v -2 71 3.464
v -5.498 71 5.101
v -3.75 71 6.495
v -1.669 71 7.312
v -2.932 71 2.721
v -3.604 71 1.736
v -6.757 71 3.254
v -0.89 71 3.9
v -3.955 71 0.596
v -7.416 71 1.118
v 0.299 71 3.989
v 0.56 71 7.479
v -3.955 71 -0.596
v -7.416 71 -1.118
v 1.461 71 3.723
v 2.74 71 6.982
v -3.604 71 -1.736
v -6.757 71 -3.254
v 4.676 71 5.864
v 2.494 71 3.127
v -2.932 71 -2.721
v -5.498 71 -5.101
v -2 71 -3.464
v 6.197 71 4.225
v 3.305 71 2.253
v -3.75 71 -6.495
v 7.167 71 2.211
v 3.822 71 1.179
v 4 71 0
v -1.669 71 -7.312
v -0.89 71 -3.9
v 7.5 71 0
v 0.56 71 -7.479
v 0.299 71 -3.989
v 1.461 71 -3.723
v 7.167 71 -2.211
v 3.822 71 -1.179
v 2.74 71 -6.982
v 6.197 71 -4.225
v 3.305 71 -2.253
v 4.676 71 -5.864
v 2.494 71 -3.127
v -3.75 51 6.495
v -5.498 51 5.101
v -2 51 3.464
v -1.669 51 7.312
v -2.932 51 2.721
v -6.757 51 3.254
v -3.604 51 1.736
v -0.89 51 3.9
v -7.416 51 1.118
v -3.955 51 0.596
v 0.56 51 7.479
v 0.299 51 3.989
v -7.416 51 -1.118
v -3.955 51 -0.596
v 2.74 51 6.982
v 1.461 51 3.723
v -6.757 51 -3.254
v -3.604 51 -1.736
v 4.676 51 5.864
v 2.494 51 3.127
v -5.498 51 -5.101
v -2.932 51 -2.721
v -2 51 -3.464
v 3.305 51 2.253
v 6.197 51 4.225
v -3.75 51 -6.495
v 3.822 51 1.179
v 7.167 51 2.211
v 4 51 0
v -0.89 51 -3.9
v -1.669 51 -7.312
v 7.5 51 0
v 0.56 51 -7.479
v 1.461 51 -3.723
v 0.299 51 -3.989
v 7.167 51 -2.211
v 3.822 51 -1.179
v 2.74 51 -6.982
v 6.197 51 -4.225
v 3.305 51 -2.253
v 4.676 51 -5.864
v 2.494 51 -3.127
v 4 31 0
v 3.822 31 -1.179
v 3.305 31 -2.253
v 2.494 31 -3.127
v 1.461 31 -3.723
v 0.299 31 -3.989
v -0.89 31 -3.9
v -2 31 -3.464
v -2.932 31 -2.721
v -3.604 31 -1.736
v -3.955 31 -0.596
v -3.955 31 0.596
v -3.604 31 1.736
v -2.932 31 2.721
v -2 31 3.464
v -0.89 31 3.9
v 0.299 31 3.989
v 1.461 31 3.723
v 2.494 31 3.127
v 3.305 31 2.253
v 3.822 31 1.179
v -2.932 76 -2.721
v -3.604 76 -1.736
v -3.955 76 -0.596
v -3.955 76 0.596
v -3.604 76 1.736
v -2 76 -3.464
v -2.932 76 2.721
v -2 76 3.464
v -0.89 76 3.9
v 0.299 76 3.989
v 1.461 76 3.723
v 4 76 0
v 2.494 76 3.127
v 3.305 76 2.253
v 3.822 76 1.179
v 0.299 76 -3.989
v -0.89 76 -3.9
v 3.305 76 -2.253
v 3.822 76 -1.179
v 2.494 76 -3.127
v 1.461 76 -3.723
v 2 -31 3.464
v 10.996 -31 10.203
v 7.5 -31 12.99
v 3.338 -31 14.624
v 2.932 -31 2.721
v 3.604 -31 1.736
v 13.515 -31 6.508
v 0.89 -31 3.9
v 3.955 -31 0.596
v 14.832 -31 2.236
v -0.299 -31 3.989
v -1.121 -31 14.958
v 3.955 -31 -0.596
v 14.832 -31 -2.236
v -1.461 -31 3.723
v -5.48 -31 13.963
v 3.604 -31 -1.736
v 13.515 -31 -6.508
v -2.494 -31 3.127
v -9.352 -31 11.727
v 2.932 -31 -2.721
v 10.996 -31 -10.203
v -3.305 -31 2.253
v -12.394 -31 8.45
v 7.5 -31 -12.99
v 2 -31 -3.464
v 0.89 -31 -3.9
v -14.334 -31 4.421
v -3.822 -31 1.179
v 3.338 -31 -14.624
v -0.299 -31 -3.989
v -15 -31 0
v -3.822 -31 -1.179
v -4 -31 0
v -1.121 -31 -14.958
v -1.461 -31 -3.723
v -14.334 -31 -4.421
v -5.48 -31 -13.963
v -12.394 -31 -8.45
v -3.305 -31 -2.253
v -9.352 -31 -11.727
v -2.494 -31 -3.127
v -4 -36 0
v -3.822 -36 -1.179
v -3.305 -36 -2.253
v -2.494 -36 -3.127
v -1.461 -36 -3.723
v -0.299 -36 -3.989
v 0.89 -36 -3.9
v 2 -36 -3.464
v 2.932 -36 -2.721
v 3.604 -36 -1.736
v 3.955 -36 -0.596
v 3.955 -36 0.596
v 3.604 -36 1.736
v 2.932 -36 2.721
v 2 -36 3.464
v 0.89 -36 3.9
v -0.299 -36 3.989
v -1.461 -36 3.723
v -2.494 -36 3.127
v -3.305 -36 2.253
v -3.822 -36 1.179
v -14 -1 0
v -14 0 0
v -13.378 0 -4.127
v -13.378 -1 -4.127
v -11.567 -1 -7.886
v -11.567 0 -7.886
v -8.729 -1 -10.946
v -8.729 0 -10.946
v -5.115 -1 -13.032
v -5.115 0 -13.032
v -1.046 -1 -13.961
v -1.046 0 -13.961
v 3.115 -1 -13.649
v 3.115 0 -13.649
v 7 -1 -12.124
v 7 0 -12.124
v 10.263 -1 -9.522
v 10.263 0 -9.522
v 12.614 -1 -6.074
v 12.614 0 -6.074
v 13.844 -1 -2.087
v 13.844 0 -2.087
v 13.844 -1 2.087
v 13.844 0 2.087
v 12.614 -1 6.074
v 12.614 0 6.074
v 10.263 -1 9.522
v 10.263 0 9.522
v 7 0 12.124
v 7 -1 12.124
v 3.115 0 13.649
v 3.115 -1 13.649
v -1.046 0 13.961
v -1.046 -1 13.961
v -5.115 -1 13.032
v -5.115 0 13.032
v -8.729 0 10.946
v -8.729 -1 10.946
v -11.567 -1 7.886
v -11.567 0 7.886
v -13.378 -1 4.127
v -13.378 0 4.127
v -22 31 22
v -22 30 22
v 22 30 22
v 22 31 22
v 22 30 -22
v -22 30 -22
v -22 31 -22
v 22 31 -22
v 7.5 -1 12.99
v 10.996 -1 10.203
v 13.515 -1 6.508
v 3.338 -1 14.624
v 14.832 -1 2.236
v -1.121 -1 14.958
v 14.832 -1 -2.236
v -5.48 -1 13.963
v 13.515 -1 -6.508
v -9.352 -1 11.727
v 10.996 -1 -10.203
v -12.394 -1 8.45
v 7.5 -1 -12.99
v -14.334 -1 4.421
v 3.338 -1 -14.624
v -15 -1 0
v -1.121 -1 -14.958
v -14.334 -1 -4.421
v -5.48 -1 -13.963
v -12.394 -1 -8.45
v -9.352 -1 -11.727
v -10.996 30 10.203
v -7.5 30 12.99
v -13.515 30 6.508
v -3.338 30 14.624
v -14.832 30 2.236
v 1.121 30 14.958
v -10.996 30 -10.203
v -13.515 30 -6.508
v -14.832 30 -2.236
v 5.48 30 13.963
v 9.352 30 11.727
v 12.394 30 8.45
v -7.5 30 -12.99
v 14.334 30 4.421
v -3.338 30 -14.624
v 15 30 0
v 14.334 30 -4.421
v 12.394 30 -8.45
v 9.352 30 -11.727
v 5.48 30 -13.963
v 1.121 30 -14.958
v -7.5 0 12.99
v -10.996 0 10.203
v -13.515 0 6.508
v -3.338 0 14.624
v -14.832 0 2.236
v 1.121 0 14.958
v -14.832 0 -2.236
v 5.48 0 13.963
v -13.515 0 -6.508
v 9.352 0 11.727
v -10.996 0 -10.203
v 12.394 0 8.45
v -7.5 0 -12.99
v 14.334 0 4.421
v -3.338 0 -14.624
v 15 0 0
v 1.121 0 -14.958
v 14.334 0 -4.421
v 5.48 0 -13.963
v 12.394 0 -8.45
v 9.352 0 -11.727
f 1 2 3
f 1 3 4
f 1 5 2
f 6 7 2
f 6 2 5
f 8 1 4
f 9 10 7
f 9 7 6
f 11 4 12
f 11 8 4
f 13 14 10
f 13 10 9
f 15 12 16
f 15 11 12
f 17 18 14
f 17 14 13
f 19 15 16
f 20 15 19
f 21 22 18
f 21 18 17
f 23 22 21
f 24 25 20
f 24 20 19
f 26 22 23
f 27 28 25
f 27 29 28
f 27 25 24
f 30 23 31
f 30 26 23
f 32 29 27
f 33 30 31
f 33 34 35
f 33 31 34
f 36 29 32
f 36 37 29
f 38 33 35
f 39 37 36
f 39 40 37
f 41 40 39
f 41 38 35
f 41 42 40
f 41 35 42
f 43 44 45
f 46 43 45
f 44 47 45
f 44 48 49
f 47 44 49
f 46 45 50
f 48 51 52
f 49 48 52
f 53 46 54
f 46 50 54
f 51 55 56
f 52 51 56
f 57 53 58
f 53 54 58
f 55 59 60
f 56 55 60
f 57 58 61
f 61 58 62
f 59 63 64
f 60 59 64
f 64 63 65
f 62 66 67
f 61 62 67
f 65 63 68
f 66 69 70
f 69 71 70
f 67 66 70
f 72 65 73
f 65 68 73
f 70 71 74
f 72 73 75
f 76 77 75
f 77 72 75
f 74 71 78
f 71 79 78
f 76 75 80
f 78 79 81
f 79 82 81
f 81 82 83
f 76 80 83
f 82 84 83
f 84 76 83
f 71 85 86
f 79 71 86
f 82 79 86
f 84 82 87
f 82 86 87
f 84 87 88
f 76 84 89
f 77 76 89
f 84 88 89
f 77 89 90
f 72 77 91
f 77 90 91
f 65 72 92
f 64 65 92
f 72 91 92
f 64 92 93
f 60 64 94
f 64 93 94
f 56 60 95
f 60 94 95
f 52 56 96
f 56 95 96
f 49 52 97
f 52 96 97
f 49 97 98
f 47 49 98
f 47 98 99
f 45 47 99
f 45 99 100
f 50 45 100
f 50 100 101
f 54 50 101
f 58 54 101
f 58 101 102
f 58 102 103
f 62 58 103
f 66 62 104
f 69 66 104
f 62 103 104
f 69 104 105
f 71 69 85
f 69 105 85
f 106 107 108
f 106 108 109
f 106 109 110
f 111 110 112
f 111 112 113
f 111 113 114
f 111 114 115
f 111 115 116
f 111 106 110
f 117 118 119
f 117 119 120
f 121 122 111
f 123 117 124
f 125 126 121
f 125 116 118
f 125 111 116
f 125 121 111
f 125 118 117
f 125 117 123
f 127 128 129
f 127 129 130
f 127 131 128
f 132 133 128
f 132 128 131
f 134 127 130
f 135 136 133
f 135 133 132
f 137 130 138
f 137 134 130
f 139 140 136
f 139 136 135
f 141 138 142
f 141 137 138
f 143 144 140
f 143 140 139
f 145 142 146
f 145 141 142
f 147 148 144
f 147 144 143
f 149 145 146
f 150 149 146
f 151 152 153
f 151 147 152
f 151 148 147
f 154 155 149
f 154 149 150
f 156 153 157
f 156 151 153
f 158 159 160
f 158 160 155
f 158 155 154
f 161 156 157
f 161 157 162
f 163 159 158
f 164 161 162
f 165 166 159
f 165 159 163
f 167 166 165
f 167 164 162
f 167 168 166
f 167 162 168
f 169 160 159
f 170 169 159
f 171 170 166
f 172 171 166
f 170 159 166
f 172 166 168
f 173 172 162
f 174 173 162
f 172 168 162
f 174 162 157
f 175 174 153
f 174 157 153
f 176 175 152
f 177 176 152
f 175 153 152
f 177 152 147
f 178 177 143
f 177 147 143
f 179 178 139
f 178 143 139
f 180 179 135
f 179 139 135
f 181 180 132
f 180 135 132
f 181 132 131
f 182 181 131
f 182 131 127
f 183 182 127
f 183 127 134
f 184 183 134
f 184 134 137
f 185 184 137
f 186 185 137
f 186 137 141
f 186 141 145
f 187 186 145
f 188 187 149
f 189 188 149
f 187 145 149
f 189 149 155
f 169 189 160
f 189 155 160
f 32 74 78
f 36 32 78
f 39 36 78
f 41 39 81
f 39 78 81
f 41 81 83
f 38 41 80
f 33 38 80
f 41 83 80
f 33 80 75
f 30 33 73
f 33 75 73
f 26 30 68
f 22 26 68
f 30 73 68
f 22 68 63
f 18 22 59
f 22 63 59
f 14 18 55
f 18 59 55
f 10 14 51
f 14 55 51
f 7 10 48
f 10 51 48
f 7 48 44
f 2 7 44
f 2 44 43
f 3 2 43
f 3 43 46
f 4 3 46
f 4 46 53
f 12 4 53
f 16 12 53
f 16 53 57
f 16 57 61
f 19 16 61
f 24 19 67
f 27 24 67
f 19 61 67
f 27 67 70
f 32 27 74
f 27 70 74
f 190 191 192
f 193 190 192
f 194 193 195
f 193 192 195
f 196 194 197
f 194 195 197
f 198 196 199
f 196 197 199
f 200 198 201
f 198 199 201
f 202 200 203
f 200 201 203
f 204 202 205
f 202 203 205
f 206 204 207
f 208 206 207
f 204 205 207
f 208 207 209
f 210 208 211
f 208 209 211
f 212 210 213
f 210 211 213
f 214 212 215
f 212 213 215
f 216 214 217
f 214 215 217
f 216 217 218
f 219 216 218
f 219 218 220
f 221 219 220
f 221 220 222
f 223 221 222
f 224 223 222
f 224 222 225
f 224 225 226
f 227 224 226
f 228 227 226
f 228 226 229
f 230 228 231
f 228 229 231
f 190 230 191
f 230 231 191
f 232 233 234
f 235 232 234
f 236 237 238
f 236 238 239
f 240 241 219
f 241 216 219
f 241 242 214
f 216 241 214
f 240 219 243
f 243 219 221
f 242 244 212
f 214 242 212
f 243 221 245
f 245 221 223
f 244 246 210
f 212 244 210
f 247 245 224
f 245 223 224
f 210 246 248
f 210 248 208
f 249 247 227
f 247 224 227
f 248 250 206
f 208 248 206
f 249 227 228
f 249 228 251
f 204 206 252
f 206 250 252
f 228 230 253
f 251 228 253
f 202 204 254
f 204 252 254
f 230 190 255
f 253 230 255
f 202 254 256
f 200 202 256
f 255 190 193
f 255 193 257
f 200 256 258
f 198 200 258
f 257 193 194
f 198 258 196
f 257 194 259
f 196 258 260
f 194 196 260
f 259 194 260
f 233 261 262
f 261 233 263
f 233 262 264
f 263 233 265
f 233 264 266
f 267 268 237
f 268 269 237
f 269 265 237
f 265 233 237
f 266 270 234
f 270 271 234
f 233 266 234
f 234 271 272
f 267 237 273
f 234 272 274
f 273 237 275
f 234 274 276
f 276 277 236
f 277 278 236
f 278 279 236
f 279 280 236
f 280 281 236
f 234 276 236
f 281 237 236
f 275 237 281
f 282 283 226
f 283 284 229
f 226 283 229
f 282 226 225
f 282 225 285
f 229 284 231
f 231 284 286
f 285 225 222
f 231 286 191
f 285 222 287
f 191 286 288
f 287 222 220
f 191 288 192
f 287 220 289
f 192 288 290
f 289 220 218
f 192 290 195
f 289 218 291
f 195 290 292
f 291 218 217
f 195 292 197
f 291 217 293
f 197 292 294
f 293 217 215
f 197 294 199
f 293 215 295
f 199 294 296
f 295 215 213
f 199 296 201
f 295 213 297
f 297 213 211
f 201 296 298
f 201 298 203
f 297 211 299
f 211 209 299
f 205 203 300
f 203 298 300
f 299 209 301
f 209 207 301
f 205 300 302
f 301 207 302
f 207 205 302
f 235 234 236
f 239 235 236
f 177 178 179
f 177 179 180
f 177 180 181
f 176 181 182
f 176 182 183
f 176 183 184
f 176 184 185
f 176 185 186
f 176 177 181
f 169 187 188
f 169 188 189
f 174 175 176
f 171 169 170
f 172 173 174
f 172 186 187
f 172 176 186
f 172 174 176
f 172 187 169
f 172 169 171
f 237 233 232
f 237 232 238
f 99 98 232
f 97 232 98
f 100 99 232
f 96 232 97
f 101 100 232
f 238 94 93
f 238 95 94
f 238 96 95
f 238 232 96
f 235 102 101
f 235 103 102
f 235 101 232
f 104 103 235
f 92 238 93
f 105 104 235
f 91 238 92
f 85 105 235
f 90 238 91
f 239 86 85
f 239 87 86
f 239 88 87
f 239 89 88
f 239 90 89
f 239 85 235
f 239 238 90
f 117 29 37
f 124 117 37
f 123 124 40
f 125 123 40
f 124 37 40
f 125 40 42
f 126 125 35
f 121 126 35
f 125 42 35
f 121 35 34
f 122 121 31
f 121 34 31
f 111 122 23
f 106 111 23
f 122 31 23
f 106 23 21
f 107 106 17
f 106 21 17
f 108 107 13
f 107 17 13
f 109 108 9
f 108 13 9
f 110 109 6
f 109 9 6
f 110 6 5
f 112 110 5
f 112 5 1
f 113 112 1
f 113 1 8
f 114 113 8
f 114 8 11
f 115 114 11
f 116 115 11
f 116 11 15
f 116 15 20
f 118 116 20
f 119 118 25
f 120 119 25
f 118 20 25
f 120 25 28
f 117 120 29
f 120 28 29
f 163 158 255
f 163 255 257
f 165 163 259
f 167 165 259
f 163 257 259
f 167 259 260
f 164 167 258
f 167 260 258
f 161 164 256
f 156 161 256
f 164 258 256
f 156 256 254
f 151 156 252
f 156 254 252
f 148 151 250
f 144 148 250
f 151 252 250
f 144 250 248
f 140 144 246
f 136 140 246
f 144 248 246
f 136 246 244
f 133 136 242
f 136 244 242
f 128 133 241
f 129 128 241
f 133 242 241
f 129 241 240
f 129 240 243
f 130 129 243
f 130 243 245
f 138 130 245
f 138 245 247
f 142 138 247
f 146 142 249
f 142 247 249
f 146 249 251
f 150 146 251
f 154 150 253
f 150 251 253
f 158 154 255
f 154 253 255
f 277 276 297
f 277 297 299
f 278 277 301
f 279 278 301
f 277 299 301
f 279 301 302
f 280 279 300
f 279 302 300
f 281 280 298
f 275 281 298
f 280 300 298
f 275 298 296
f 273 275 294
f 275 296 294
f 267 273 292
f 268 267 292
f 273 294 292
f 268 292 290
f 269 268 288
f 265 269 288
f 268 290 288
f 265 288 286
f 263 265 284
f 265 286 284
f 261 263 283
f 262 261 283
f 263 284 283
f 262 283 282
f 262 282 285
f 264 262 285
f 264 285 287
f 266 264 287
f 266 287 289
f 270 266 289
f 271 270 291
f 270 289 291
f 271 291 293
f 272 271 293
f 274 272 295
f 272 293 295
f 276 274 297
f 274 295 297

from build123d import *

# Parameters (mm, degrees)
SKETCH1_R           = 15
BOSS_EXTRUDE1_DEPTH = 30
SKETCH2_W           = 44
SKETCH2_H           = 44
BOSS_EXTRUDE2_DEPTH = 1
SKETCH3_R           = 4
BOSS_EXTRUDE3_DEPTH = 20
SKETCH4_R           = 7.5
BOSS_EXTRUDE4_DEPTH = 20
SKETCH5_R           = 4
BOSS_EXTRUDE5_DEPTH = 5
SKETCH6_R           = 14
BOSS_EXTRUDE6_DEPTH = 1
SKETCH7_R           = 15
BOSS_EXTRUDE7_DEPTH = 30
SKETCH8_R           = 4
BOSS_EXTRUDE8_DEPTH = 5


with BuildPart() as part:
    # Sketch1 → Boss-Extrude1 (new body)
    with BuildSketch(Plane(origin=(0, 0, 0), x_dir=(1, 0, 0), z_dir=(0, 1, 0))):
        Circle(SKETCH1_R)
    extrude(amount=BOSS_EXTRUDE1_DEPTH)

    # Sketch2 → Boss-Extrude2 (add)
    with BuildSketch(Plane(origin=(0, 30, 0), x_dir=(1, 0, 0), z_dir=(0, 1, 0))):
        Rectangle(SKETCH2_W, SKETCH2_H)
    extrude(amount=BOSS_EXTRUDE2_DEPTH)

    # Sketch3 → Boss-Extrude3 (add)
    with BuildSketch(Plane(origin=(0, 31, 0), x_dir=(1, 0, 0), z_dir=(0, 1, 0))):
        Circle(SKETCH3_R)
    extrude(amount=BOSS_EXTRUDE3_DEPTH)

    # Sketch4 → Boss-Extrude4 (add)
    with BuildSketch(Plane(origin=(0, 51, 0), x_dir=(1, 0, 0), z_dir=(0, 1, 0))):
        Circle(SKETCH4_R)
    extrude(amount=BOSS_EXTRUDE4_DEPTH)

    # Sketch5 → Boss-Extrude5 (add)
    with BuildSketch(Plane(origin=(0, 71, 0), x_dir=(1, 0, 0), z_dir=(0, 1, 0))):
        Circle(SKETCH5_R)
    extrude(amount=BOSS_EXTRUDE5_DEPTH)

    # Sketch6 → Boss-Extrude6 (add)
    with BuildSketch(Plane(origin=(0, 0, 0), x_dir=(-1, 0, 0), z_dir=(0, -1, 0))):
        Circle(SKETCH6_R)
    extrude(amount=BOSS_EXTRUDE6_DEPTH)

    # Sketch7 → Boss-Extrude7 (add)
    with BuildSketch(Plane(origin=(0, -1, 0), x_dir=(-1, 0, 0), z_dir=(0, -1, 0))):
        Circle(SKETCH7_R)
    extrude(amount=BOSS_EXTRUDE7_DEPTH)

    # Sketch8 → Boss-Extrude8 (add)
    with BuildSketch(Plane(origin=(0, -31, 0), x_dir=(-1, 0, 0), z_dir=(0, -1, 0))):
        Circle(SKETCH8_R)
    extrude(amount=BOSS_EXTRUDE8_DEPTH)


solid = part.part
